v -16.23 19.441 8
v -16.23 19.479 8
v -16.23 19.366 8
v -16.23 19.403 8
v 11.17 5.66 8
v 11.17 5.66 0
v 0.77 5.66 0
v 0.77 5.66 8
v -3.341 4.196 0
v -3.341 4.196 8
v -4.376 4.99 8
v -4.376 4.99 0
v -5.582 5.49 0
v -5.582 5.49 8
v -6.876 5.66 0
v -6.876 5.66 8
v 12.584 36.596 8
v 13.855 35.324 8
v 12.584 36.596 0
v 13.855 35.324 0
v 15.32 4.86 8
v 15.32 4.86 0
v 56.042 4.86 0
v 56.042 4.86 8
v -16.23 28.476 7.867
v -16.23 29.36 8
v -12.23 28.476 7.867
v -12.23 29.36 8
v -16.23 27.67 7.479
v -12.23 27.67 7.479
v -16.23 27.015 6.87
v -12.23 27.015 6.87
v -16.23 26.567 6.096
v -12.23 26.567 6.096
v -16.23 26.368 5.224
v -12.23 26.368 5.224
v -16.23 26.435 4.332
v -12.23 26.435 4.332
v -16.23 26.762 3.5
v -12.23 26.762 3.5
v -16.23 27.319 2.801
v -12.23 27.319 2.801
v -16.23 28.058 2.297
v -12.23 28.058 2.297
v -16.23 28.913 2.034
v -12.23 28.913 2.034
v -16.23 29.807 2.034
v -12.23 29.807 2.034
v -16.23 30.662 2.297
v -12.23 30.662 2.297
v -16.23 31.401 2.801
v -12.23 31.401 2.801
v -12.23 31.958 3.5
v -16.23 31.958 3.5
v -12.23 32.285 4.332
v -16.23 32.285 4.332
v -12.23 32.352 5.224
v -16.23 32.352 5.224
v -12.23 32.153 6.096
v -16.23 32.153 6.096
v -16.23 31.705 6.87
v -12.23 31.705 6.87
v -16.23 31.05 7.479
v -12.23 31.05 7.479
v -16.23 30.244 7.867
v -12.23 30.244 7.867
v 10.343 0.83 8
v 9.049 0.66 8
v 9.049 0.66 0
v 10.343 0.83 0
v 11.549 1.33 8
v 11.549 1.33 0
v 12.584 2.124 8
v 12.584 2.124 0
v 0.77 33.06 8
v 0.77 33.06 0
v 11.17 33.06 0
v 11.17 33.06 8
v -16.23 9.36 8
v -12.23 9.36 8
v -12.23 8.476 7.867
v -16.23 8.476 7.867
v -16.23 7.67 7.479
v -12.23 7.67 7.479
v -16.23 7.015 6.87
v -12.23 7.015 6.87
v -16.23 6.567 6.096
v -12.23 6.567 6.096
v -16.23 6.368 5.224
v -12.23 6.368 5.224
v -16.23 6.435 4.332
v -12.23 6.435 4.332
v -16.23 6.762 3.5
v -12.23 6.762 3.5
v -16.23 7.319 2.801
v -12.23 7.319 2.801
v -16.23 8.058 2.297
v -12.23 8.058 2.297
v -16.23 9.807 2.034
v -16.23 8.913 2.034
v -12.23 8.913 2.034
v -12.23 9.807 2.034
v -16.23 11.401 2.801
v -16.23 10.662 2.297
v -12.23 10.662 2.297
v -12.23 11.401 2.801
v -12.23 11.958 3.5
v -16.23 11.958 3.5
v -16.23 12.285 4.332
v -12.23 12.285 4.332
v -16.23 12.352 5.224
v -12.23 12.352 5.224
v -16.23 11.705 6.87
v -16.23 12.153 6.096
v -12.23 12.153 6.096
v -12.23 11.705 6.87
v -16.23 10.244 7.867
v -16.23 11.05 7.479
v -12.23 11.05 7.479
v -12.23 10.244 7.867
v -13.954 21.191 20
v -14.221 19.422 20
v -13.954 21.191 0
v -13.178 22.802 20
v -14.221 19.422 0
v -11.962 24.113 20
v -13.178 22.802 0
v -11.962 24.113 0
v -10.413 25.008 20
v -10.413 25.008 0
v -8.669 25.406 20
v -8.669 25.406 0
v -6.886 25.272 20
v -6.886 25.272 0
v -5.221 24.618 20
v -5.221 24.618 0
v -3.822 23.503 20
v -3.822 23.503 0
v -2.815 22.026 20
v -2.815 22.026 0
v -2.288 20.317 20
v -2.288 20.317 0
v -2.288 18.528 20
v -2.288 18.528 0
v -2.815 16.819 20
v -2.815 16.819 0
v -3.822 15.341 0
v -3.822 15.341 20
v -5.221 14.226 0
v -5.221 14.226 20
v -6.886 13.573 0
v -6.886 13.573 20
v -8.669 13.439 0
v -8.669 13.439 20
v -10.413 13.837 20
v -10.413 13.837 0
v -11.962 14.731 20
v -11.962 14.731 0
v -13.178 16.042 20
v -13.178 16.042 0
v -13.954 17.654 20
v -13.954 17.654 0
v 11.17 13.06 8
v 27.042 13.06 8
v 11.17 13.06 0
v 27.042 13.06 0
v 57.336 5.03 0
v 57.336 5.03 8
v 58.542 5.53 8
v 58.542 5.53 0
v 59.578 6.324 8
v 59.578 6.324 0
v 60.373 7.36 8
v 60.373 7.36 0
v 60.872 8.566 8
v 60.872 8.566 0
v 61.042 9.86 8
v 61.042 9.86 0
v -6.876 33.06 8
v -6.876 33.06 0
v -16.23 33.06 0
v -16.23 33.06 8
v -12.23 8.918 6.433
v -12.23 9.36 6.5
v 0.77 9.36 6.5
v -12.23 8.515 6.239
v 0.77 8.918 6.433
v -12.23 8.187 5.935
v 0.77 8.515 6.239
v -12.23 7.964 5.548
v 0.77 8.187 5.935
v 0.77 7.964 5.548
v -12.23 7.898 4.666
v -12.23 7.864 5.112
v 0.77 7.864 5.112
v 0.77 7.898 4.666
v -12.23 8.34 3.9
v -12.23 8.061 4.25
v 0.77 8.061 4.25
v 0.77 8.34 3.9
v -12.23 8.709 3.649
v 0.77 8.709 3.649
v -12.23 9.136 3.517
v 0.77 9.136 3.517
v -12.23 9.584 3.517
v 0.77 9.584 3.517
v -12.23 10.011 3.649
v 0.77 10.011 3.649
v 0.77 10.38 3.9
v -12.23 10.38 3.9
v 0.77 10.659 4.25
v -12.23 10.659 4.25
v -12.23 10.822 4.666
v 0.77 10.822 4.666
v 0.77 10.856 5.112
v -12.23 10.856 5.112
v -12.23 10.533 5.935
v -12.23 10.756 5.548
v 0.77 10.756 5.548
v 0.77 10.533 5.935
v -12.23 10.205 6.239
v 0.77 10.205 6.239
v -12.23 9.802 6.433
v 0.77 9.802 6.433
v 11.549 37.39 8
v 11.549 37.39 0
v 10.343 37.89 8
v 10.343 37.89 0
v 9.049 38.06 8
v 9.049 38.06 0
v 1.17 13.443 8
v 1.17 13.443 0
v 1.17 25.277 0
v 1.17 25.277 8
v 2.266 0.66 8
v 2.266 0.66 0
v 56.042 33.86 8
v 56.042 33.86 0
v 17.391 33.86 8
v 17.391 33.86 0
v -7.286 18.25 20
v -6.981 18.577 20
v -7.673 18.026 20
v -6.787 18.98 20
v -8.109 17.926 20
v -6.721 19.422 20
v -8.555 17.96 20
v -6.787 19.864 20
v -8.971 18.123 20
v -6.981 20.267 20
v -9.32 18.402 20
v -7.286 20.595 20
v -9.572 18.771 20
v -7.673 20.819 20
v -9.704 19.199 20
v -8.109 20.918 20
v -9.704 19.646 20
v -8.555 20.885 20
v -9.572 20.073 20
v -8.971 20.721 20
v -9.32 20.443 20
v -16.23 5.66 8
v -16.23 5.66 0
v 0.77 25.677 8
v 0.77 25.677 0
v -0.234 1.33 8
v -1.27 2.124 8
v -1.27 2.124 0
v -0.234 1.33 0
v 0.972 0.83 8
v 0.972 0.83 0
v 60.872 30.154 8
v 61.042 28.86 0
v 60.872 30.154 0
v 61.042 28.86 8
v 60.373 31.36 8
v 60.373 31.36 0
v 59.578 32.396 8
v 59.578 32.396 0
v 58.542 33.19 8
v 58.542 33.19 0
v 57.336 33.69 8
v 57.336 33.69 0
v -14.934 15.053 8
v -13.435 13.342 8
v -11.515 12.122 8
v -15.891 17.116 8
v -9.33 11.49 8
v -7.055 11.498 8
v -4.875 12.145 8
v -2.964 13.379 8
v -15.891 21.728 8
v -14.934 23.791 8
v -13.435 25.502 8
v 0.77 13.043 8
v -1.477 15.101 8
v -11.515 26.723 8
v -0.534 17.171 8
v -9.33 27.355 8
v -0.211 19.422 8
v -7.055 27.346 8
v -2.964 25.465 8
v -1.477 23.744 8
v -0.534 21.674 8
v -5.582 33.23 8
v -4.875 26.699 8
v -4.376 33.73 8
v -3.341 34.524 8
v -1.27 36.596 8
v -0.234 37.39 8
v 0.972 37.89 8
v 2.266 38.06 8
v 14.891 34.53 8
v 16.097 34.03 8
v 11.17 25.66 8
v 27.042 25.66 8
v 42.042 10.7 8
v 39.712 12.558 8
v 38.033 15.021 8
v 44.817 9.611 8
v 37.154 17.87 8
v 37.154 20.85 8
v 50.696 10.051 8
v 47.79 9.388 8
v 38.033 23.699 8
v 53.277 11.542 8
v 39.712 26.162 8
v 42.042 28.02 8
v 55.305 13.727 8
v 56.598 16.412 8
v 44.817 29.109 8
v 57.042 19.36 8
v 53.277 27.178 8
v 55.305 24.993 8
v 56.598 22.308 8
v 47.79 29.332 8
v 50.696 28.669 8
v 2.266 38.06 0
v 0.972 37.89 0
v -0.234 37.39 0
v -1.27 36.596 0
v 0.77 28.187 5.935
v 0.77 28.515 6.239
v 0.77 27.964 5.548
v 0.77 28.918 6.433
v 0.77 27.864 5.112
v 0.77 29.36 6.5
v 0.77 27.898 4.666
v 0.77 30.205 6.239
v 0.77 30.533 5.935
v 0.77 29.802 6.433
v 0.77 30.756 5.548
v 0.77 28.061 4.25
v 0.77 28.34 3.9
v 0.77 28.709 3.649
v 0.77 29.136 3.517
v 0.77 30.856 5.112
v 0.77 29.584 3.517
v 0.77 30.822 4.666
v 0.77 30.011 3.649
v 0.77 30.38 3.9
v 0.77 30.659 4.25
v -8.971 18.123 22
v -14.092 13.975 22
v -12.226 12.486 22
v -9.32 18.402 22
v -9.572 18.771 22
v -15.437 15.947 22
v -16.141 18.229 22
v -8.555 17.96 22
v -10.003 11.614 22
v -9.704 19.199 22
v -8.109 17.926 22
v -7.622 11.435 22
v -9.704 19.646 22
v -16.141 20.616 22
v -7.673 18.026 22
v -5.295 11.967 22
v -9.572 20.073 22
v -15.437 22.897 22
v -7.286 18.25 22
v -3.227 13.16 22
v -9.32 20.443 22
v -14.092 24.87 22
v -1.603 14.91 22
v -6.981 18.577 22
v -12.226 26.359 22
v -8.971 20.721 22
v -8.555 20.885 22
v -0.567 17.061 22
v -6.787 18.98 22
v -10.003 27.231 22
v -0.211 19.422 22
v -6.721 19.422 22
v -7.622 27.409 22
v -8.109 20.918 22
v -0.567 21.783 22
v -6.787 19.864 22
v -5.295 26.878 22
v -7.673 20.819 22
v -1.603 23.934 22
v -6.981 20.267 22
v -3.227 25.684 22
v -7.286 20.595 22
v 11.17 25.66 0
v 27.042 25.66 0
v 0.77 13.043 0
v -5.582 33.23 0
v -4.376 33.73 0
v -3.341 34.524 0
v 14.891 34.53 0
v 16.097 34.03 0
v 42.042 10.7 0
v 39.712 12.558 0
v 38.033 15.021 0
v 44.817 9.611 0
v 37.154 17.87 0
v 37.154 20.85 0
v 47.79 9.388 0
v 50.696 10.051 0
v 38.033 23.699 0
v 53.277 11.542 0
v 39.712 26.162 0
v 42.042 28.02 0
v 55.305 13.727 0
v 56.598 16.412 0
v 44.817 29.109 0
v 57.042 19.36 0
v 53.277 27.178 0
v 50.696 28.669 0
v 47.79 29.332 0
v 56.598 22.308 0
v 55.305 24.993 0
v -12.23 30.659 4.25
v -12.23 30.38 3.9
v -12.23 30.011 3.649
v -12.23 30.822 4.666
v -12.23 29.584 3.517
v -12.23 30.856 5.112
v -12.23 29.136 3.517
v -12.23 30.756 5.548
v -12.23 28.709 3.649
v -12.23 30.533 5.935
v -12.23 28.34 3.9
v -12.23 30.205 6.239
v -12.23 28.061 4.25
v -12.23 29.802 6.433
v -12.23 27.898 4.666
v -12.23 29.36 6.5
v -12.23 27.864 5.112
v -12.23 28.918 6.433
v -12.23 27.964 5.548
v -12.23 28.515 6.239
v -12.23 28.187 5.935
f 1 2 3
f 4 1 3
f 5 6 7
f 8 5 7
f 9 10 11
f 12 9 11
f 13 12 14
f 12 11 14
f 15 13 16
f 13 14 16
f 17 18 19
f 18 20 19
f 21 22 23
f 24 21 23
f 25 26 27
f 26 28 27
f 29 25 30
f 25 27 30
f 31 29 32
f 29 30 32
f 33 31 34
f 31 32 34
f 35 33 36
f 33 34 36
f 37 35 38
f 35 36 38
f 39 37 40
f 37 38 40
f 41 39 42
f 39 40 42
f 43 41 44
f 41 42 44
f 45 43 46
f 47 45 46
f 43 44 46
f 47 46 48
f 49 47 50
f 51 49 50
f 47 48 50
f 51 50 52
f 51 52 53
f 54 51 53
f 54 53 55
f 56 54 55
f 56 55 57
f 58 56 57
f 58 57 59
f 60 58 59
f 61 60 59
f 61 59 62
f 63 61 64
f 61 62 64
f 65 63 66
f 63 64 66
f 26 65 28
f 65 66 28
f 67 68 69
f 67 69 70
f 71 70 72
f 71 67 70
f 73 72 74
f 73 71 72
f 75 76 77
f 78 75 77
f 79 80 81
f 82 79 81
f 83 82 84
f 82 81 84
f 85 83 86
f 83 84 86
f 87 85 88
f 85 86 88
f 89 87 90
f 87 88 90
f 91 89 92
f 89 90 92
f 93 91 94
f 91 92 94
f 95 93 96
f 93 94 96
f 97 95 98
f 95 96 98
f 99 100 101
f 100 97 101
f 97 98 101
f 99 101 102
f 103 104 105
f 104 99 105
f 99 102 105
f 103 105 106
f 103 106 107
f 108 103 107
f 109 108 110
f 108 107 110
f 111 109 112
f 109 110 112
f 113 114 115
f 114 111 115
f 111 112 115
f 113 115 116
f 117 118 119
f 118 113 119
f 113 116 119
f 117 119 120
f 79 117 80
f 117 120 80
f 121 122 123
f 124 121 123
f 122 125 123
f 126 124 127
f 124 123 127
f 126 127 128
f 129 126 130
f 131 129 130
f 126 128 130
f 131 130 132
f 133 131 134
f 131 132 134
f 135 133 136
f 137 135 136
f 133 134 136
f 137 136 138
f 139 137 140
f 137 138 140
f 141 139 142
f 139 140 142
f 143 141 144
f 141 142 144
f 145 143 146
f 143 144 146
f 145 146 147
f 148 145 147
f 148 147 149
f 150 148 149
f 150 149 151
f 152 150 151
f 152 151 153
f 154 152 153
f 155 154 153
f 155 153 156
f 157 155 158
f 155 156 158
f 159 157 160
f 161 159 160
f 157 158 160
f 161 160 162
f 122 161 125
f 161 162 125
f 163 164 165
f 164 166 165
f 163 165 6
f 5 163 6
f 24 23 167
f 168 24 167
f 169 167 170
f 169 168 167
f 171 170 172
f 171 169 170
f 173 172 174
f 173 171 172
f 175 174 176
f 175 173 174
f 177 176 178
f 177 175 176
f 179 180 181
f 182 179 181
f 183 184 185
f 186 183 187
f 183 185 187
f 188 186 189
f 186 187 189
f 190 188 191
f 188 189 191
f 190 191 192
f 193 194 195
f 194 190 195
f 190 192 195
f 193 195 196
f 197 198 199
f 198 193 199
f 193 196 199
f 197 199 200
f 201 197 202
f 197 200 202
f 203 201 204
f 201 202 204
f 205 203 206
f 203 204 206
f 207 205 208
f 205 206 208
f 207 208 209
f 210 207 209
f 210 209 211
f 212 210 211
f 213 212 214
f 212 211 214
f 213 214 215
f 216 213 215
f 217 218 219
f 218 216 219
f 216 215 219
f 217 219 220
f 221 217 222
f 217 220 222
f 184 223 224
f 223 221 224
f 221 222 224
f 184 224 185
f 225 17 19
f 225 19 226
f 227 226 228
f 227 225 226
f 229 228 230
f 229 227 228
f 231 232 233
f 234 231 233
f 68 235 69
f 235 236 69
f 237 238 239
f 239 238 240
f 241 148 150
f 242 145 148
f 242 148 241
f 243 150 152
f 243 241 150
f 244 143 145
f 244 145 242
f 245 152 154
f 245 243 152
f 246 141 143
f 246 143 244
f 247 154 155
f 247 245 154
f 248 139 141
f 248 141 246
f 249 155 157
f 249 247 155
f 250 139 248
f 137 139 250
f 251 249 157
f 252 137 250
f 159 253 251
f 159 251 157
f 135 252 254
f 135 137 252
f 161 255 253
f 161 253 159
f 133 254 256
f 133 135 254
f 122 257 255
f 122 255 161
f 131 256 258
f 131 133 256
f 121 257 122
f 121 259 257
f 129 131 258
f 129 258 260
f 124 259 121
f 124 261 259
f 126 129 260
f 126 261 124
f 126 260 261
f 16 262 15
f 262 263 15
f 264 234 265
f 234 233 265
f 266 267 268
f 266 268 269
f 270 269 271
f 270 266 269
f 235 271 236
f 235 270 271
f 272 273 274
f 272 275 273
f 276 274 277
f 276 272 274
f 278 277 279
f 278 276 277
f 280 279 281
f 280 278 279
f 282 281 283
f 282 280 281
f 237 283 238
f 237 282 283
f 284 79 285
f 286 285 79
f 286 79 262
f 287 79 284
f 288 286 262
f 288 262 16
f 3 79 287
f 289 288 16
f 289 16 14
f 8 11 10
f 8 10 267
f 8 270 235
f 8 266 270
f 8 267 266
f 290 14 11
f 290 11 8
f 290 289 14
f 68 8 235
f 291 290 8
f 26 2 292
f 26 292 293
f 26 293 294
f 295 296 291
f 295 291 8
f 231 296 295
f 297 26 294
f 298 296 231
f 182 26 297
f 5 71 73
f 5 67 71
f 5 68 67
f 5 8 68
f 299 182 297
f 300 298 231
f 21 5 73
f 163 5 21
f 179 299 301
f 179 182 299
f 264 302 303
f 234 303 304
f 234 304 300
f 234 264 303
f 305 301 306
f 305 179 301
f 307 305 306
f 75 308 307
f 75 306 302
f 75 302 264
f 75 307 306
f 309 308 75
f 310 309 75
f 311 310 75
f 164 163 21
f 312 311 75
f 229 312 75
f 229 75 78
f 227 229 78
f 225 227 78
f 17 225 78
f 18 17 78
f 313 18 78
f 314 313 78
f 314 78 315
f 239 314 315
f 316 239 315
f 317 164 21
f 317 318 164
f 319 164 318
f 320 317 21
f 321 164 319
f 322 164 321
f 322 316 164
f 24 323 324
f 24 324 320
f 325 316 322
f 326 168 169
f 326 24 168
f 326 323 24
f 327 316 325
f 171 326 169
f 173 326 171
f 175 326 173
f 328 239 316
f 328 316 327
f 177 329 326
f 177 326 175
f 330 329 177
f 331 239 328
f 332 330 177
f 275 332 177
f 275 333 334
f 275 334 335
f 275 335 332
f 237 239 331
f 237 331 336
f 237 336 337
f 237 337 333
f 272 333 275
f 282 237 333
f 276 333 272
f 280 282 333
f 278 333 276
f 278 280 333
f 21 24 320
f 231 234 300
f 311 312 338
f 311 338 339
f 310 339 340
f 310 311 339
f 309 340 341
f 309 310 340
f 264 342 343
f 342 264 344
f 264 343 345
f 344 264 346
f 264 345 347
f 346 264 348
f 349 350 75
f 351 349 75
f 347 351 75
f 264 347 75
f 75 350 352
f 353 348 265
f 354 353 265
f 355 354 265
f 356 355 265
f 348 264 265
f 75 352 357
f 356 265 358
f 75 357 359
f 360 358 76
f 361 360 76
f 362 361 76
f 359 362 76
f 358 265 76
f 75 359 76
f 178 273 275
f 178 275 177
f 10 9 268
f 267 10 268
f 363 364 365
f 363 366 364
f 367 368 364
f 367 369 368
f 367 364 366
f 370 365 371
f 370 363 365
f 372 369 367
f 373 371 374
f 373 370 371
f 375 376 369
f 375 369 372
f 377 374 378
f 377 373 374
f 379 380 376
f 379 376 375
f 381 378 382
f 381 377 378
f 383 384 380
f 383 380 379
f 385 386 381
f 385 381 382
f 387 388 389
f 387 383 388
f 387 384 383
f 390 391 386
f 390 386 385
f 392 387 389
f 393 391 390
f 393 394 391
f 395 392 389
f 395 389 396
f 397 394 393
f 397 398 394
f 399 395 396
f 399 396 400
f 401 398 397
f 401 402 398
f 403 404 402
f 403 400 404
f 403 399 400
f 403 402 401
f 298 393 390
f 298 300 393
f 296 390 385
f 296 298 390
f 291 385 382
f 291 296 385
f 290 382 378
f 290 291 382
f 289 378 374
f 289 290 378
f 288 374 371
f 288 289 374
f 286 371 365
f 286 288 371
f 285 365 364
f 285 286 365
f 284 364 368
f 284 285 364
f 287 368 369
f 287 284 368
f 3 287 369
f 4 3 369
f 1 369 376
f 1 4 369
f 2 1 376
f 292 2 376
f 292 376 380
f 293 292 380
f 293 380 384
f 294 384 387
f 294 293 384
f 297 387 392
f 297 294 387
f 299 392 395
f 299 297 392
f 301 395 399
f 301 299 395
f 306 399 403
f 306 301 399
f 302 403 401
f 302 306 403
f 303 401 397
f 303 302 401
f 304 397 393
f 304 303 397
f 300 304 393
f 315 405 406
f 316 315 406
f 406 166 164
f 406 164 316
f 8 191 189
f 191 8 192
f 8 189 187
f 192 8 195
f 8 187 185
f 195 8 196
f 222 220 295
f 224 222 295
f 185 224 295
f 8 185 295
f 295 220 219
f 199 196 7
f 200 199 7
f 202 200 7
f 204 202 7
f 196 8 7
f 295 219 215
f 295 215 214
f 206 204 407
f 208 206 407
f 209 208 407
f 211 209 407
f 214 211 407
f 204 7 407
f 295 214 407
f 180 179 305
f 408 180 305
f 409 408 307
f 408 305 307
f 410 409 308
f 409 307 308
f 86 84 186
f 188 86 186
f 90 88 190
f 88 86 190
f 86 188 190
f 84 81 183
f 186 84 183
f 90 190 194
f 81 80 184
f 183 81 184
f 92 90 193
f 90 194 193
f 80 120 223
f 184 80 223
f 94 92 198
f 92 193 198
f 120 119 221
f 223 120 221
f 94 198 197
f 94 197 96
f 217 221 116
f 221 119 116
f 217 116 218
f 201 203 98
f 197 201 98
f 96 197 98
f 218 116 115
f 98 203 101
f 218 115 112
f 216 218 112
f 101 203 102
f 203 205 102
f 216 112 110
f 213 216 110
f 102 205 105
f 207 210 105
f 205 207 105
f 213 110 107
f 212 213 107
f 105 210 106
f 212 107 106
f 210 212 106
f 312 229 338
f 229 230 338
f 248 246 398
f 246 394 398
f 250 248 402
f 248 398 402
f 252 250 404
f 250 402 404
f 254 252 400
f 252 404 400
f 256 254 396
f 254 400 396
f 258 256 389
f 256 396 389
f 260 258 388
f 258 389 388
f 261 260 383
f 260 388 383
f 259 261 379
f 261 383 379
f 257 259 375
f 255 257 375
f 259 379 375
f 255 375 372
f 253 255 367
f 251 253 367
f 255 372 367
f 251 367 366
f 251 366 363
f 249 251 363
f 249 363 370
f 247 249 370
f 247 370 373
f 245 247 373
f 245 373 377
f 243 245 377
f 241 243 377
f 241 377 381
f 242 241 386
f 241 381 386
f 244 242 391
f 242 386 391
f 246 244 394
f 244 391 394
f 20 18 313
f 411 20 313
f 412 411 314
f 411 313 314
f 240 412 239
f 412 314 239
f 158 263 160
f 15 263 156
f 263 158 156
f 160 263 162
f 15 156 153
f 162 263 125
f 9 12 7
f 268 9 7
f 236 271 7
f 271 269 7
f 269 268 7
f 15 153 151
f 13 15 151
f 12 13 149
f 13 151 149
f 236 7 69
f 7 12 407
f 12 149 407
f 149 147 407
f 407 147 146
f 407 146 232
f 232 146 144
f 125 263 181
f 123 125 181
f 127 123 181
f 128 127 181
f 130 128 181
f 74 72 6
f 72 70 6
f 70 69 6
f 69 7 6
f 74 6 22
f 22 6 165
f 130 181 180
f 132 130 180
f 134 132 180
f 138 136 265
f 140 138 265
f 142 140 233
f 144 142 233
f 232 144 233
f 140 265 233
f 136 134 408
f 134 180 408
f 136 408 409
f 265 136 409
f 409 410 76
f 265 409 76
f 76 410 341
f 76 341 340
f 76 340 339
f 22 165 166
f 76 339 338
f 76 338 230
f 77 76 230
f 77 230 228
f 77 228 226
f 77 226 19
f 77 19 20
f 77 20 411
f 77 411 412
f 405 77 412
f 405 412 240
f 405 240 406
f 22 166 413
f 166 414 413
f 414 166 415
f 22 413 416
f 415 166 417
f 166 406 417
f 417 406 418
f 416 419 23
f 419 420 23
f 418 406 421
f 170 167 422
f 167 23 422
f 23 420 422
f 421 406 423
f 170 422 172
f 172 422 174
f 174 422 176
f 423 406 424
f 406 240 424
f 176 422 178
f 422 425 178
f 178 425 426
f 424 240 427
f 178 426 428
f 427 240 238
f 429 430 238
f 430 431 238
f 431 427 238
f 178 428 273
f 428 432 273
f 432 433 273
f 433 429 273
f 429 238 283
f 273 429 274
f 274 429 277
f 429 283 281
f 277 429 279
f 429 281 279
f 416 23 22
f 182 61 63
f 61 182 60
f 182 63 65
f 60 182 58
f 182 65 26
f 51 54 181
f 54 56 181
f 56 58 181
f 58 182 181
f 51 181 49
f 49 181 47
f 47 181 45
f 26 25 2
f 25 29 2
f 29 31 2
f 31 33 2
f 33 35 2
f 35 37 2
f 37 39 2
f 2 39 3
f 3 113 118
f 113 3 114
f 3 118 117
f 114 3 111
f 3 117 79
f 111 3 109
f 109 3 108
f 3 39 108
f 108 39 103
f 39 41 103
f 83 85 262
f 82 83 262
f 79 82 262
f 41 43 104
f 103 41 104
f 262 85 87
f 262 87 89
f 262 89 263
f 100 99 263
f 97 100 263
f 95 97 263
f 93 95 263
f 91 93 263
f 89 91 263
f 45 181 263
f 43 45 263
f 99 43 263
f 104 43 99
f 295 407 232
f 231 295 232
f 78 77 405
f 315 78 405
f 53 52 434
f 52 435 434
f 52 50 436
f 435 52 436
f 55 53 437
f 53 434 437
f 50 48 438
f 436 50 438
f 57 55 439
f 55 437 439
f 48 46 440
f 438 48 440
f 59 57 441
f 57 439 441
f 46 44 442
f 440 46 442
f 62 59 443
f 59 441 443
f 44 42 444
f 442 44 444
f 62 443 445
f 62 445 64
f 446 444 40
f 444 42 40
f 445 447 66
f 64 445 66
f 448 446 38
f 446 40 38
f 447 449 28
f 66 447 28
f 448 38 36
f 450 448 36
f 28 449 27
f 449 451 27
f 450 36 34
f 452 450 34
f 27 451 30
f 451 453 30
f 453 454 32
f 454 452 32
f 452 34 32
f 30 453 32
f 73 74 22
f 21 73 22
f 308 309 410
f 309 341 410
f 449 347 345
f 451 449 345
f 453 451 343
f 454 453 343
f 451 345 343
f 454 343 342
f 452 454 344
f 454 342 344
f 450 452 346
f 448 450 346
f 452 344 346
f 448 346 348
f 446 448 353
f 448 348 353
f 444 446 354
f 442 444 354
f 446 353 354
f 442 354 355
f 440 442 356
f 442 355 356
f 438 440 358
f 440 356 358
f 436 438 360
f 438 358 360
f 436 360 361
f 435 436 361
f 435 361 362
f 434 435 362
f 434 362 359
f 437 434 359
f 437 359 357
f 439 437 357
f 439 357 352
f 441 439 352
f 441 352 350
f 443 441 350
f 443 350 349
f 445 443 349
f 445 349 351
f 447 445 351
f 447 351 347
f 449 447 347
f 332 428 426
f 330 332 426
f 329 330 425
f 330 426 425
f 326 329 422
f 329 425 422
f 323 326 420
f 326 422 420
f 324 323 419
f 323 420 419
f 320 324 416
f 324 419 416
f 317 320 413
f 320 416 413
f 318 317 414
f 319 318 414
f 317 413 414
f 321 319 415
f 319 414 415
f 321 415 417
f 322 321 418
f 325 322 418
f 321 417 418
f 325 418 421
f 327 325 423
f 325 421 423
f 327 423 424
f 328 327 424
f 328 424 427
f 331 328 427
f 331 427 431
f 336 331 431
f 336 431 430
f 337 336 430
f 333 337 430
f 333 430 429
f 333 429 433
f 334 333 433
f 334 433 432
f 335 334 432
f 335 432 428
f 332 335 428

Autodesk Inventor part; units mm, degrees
ref_plane "YZ Plane" through (0, 0, 0) normal (1, 0, 0) x (0, 1, 0)
ref_plane "XZ Plane" through (0, 0, 0) normal (0, 1, 0) x (-1, 0, 0)
ref_plane "XY Plane" through (0, 0, 0) normal (0, 0, 1) x (1, 0, 0)
ref_plane "Arbeitsebene1" through (0, 0, 0) normal (0, 0, 1) x (1, 0, 0)
sketch "Skizze1" plane through (0, 0, 0) normal (0, 0, 1) x (1, 0, 0)
  arc A0 (9.5966, 13.5152) -> (9.0972, 14.0928) centre (8.4862, 13.06) ccw construction
  arc A1 (8.9755, 14.2862) -> (9.0972, 14.0928) centre (9.2245, 14.308) ccw construction
  line L0 (8.9755, 14.2862) -> (8.9453, 14.6318) construction
  arc A2 (8.9453, 14.6318) -> (8.6962, 14.86) centre (8.6962, 14.61) ccw construction
  line L1 (8.6962, 14.86) -> (8.2438, 14.86) construction
  arc A3 (8.2438, 14.86) -> (7.9947, 14.6318) centre (8.2438, 14.61) ccw construction
  line L2 (7.9947, 14.6318) -> (7.9627, 14.2652) construction
  arc A4 (7.8468, 14.0755) -> (7.9627, 14.2652) centre (7.7136, 14.287) ccw construction
  arc A5 (7.8468, 14.0755) -> (7.3759, 13.5152) centre (8.4862, 13.06) ccw construction
  arc A6 (7.1446, 13.36) -> (7.3759, 13.5152) centre (7.1446, 13.61) ccw construction
  line L3 (7.1446, 13.36) -> (6.47, 13.36) construction
  line L4 (6.47, 13.36) -> (5.97, 13.86) construction
  line L5 (5.97, 13.86) -> (5.97, 24.86) construction
  line L6 (5.97, 24.86) -> (6.47, 25.36) construction
  line L7 (6.47, 25.36) -> (7.1446, 25.36) construction
  arc A7 (7.3759, 25.2048) -> (7.1446, 25.36) centre (7.1446, 25.11) ccw construction
  arc A8 (7.3759, 25.2048) -> (7.8468, 24.6445) centre (8.4862, 25.66) ccw construction
  arc A9 (7.9627, 24.4548) -> (7.8468, 24.6445) centre (7.7136, 24.433) ccw construction
  line L8 (7.9627, 24.4548) -> (7.9947, 24.0882) construction
  arc A10 (7.9947, 24.0882) -> (8.2438, 23.86) centre (8.2438, 24.11) ccw construction
  line L9 (8.2438, 23.86) -> (8.6962, 23.86) construction
  arc A11 (8.6962, 23.86) -> (8.9453, 24.0882) centre (8.6962, 24.11) ccw construction
  line L10 (8.9453, 24.0882) -> (8.9755, 24.4338) construction
  arc A12 (9.0972, 24.6272) -> (8.9755, 24.4338) centre (9.2245, 24.412) ccw construction
  arc A13 (9.0972, 24.6272) -> (9.5966, 25.2048) centre (8.4862, 25.66) ccw construction
  arc A14 (9.8279, 25.36) -> (9.5966, 25.2048) centre (9.8279, 25.11) ccw construction
  line L11 (9.8279, 25.36) -> (10.97, 25.36) construction
  line L12 (10.97, 25.36) -> (10.97, 32.26) construction
  line L13 (10.97, 32.26) -> (10.37, 32.86) construction
  line L14 (10.37, 32.86) -> (6.97, 32.86) construction
  arc A15 (6.17, 32.86) -> (6.97, 32.86) centre (6.57, 33.16) ccw construction
  line L15 (6.17, 32.86) -> (1.57, 32.86) construction
  line L16 (1.57, 32.86) -> (0.97, 32.26) construction
  line L17 (0.97, 32.26) -> (0.97, 25.76) construction
  line L18 (0.97, 25.76) -> (1.37, 25.36) construction
  line L19 (1.37, 25.36) -> (1.37, 13.36) construction
  line L20 (1.37, 13.36) -> (0.97, 12.96) construction
  line L21 (0.97, 12.96) -> (0.97, 6.46) construction
  line L22 (0.97, 6.46) -> (1.57, 5.86) construction
  line L23 (1.57, 5.86) -> (10.37, 5.86) construction
  line L24 (10.37, 5.86) -> (10.97, 6.46) construction
  line L25 (10.97, 6.46) -> (10.97, 13.36) construction
  line L26 (10.97, 13.36) -> (9.8279, 13.36) construction
  arc A16 (9.5966, 13.5152) -> (9.8279, 13.36) centre (9.8279, 13.61) ccw construction
  line L27 (10.4528, 5.66) -> (1.4872, 5.66) construction
  line L28 (1.4872, 5.66) -> (0.77, 6.3772) construction
  line L29 (0.77, 6.3772) -> (0.77, 13.0428) construction
  line L30 (0.77, 13.0428) -> (1.17, 13.4428) construction
  line L31 (1.17, 13.4428) -> (1.17, 25.2772) construction
  line L32 (1.17, 25.2772) -> (0.77, 25.6772) construction
  line L33 (0.77, 25.6772) -> (0.77, 32.3428) construction
  line L34 (0.77, 32.3428) -> (1.4872, 33.06) construction
  line L35 (1.4872, 33.06) -> (6.2872, 33.06) construction
  arc A17 (6.2872, 33.06) -> (6.8528, 33.06) centre (6.57, 33.16) ccw construction
  line L36 (6.8528, 33.06) -> (10.4528, 33.06) construction
  line L37 (10.4528, 33.06) -> (11.17, 32.3428) construction
  line L38 (11.17, 32.3428) -> (11.17, 25.16) construction
  line L39 (11.17, 25.16) -> (9.8279, 25.16) construction
  arc A18 (9.8279, 25.16) -> (9.7816, 25.129) centre (9.8279, 25.11) ccw construction
  arc A19 (9.1991, 24.4551) -> (9.7816, 25.129) centre (8.4862, 25.66) ccw construction
  arc A20 (9.1991, 24.4551) -> (9.1747, 24.4164) centre (9.2245, 24.412) ccw construction
  line L40 (9.1747, 24.4164) -> (9.1445, 24.0708) construction
  arc A21 (8.6962, 23.66) -> (9.1445, 24.0708) centre (8.6962, 24.11) ccw construction
  line L41 (8.6962, 23.66) -> (8.2438, 23.66) construction
  arc A22 (7.7955, 24.0708) -> (8.2438, 23.66) centre (8.2438, 24.11) ccw construction
  line L42 (7.7955, 24.0708) -> (7.7634, 24.4373) construction
  arc A23 (7.7634, 24.4373) -> (7.7403, 24.4753) centre (7.7136, 24.433) ccw construction
  arc A24 (7.1909, 25.129) -> (7.7403, 24.4753) centre (8.4862, 25.66) ccw construction
  arc A25 (7.1909, 25.129) -> (7.1446, 25.16) centre (7.1446, 25.11) ccw construction
  line L43 (7.1446, 25.16) -> (6.5528, 25.16) construction
  line L44 (6.5528, 25.16) -> (6.17, 24.7772) construction
  line L45 (6.17, 24.7772) -> (6.17, 13.9428) construction
  line L46 (6.17, 13.9428) -> (6.5528, 13.56) construction
  line L47 (6.5528, 13.56) -> (7.1446, 13.56) construction
  arc A26 (7.1446, 13.56) -> (7.1909, 13.591) centre (7.1446, 13.61) ccw construction
  arc A27 (7.7403, 14.2447) -> (7.1909, 13.591) centre (8.4862, 13.06) ccw construction
  arc A28 (7.7403, 14.2447) -> (7.7634, 14.2827) centre (7.7136, 14.287) ccw construction
  line L48 (7.7634, 14.2827) -> (7.7955, 14.6492) construction
  arc A29 (8.2438, 15.06) -> (7.7955, 14.6492) centre (8.2438, 14.61) ccw construction
  line L49 (8.2438, 15.06) -> (8.6962, 15.06) construction
  arc A30 (9.1445, 14.6492) -> (8.6962, 15.06) centre (8.6962, 14.61) ccw construction
  line L50 (9.1445, 14.6492) -> (9.1747, 14.3036) construction
  arc A31 (9.1747, 14.3036) -> (9.1991, 14.2649) centre (9.2245, 14.308) ccw construction
  arc A32 (9.7816, 13.591) -> (9.1991, 14.2649) centre (8.4862, 13.06) ccw construction
  arc A33 (9.7816, 13.591) -> (9.8279, 13.56) centre (9.8279, 13.61) ccw construction
  line L51 (9.8279, 13.56) -> (11.17, 13.56) construction
  line L52 (11.17, 13.56) -> (11.17, 6.3772) construction
  line L53 (11.17, 6.3772) -> (10.4528, 5.66) construction
  line L54 (11.17, 25.66) -> (33.0091, 25.66)
  line L55 (11.17, 25.66) -> (33.0091, 25.66) construction
  line L56 (33.0091, 33.86) -> (15.3197, 33.86)
  line L57 (15.3197, 33.86) -> (11.1197, 38.06)
  line L58 (11.1197, 38.06) -> (0.1946, 38.06)
  line L59 (-16.23, 33.06) -> (-16.23, 19.36)
  line L60 (-16.23, 19.36) -> (1.17, 19.36)
  line L61 (1.17, 19.36) -> (1.17, 25.2772)
  line L62 (1.17, 25.2772) -> (0.77, 25.6772)
  line L63 (0.77, 25.6772) -> (0.77, 33.06)
  line L64 (0.77, 33.06) -> (11.17, 33.06)
  line L65 (11.17, 33.06) -> (11.17, 25.66)
  line L66 (36.7731, 34.36) -> (36.7731, 25.3561) projected
  line L67 (36.7731, 13.415) -> (36.7731, 4.36) projected
  line L68 (0.1946, 38.06) -> (-4.8054, 33.06)
  line L69 (0.1946, 38.06) -> (7.2656, 38.06) construction
  line L70 (-4.8054, 33.06) -> (-16.23, 33.06)
  line L71 (33.0091, 33.86) -> (33.0091, 25.66)
  line L72 (33.0091, 33.86) -> (61.0424, 33.86)
  line L73 (61.0424, 33.86) -> (61.0424, 19.36)
  line L74 (61.0424, 19.36) -> (57.0424, 19.36)
  line L75 (37.0424, 19.36) -> (27.0424, 19.36)
  line L76 (27.0424, 19.36) -> (27.0424, 25.66)
  circle A34 centre (47.0424, 19.36) radius 10
  point P0 (0, 0)
  point P1 (-2.0031, 19.36)
  point P2 (-4.8031, 19.36)
  dimension "d0" = 0.2
  dimension "d2" = 5
  dimension "d4" = 17
  dimension "d7" = 0.5
  dimension "d8" = 3.5
  dimension "d21" = 135
  dimension "d45" = 20
  dimension "d46" = 14
  dimension "d47" = 20
  dimension "d48" = 14.5
extrude "Extrusion1" add sketch "Skizze1" along normal blind 8 contours L65 L64 L63 L62 L61 L60 L59 L70 L68 L58 L57 L56 L71 L54 | L54 L71 L72 L73 L74 A34 L75 L76
sketch "Skizze2" plane through (-16.23, 19.36, 0) normal (-1, 0, 0) x (0, 0, 1)
  circle A0 centre (5, 10) radius 1.75 projected
  line L0 (0, 13.7) -> (0, 0) projected
  line L1 (0, 0) -> (8, 0) projected
  line L2 (8, 13.7) -> (8, 0) projected
  line L3 (0, 13.7) -> (8, 13.7) projected
  circle A1 centre (5, 10) radius 1.5
  point P0 (0, -19.36)
  dimension "d11" = 3
hole "Bohrung1" at (-16.23, 29.36, 5) direction (1, 0, 0) diameter 3 depth 20 tip angle 118 counterbore diameter 6 counterbore depth 4
mirror "Spiegeln2" about plane through (-16.23, 19.36, 0) normal (0, -1, 0) of "Extrusion1", "Bohrung1"
sketch "Skizze6" plane through (0, 0, 8) normal (0, 0, 1) x (1, 0, 0)
  line L0 (-16.23, 33.06) -> (-16.23, 5.66) projected
  circle A0 centre (-8.2208, 19.4223) radius 1.9812 projected
  circle A1 centre (-8.2208, 19.4223) radius 8.0094
  point P0 (0, 0)
  point P1 (-16.23, 19.36)
extrude "Extrusion5" add sketch "Skizze6" along normal blind 14 contours A0 | A1
sketch "Skizze7" plane through (0, 0, 0) normal (0, 0, -1) x (-1, 0, 0)
  circle A0 centre (8.2208, 19.4223) radius 6
  circle A1 centre (8.2208, 19.4223) radius 1.9812 projected
  point P0 (0, 0)
  dimension "d34" = 12
extrude "Extrusion6" cut sketch "Skizze7" against normal blind 20 contours A0 | A1
sketch "Skizze8" plane through (-7.7141, 19.36, 22) normal (0, 0, 1) x (1, 0, 0)
  circle A0 centre (-0.5067, 0.0623) radius 1.5
  circle A1 centre (-0.5067, 0.0623) radius 1.4224 projected
  point P0 (7.7141, -19.36)
  dimension "d37" = 3
extrude "Extrusion7" cut sketch "Skizze8" against normal blind 15 contours A0 | A1
fillet "Rundung1" radius 5 9 edges at (61.0424, 33.86, 4) (61.0424, 4.86, 4) (11.1197, 0.66, 4) (0.1946, 0.66, 4) (-4.8054, 5.66, 4) (15.3197, 33.86, 4) (11.1197, 38.06, 4) (0.1946, 38.06, 4) (-4.8054, 33.06, 4)
properties part number "30_Cube_Cube_Z_Focus_NEMA8_captive_objectivemount_v0"
